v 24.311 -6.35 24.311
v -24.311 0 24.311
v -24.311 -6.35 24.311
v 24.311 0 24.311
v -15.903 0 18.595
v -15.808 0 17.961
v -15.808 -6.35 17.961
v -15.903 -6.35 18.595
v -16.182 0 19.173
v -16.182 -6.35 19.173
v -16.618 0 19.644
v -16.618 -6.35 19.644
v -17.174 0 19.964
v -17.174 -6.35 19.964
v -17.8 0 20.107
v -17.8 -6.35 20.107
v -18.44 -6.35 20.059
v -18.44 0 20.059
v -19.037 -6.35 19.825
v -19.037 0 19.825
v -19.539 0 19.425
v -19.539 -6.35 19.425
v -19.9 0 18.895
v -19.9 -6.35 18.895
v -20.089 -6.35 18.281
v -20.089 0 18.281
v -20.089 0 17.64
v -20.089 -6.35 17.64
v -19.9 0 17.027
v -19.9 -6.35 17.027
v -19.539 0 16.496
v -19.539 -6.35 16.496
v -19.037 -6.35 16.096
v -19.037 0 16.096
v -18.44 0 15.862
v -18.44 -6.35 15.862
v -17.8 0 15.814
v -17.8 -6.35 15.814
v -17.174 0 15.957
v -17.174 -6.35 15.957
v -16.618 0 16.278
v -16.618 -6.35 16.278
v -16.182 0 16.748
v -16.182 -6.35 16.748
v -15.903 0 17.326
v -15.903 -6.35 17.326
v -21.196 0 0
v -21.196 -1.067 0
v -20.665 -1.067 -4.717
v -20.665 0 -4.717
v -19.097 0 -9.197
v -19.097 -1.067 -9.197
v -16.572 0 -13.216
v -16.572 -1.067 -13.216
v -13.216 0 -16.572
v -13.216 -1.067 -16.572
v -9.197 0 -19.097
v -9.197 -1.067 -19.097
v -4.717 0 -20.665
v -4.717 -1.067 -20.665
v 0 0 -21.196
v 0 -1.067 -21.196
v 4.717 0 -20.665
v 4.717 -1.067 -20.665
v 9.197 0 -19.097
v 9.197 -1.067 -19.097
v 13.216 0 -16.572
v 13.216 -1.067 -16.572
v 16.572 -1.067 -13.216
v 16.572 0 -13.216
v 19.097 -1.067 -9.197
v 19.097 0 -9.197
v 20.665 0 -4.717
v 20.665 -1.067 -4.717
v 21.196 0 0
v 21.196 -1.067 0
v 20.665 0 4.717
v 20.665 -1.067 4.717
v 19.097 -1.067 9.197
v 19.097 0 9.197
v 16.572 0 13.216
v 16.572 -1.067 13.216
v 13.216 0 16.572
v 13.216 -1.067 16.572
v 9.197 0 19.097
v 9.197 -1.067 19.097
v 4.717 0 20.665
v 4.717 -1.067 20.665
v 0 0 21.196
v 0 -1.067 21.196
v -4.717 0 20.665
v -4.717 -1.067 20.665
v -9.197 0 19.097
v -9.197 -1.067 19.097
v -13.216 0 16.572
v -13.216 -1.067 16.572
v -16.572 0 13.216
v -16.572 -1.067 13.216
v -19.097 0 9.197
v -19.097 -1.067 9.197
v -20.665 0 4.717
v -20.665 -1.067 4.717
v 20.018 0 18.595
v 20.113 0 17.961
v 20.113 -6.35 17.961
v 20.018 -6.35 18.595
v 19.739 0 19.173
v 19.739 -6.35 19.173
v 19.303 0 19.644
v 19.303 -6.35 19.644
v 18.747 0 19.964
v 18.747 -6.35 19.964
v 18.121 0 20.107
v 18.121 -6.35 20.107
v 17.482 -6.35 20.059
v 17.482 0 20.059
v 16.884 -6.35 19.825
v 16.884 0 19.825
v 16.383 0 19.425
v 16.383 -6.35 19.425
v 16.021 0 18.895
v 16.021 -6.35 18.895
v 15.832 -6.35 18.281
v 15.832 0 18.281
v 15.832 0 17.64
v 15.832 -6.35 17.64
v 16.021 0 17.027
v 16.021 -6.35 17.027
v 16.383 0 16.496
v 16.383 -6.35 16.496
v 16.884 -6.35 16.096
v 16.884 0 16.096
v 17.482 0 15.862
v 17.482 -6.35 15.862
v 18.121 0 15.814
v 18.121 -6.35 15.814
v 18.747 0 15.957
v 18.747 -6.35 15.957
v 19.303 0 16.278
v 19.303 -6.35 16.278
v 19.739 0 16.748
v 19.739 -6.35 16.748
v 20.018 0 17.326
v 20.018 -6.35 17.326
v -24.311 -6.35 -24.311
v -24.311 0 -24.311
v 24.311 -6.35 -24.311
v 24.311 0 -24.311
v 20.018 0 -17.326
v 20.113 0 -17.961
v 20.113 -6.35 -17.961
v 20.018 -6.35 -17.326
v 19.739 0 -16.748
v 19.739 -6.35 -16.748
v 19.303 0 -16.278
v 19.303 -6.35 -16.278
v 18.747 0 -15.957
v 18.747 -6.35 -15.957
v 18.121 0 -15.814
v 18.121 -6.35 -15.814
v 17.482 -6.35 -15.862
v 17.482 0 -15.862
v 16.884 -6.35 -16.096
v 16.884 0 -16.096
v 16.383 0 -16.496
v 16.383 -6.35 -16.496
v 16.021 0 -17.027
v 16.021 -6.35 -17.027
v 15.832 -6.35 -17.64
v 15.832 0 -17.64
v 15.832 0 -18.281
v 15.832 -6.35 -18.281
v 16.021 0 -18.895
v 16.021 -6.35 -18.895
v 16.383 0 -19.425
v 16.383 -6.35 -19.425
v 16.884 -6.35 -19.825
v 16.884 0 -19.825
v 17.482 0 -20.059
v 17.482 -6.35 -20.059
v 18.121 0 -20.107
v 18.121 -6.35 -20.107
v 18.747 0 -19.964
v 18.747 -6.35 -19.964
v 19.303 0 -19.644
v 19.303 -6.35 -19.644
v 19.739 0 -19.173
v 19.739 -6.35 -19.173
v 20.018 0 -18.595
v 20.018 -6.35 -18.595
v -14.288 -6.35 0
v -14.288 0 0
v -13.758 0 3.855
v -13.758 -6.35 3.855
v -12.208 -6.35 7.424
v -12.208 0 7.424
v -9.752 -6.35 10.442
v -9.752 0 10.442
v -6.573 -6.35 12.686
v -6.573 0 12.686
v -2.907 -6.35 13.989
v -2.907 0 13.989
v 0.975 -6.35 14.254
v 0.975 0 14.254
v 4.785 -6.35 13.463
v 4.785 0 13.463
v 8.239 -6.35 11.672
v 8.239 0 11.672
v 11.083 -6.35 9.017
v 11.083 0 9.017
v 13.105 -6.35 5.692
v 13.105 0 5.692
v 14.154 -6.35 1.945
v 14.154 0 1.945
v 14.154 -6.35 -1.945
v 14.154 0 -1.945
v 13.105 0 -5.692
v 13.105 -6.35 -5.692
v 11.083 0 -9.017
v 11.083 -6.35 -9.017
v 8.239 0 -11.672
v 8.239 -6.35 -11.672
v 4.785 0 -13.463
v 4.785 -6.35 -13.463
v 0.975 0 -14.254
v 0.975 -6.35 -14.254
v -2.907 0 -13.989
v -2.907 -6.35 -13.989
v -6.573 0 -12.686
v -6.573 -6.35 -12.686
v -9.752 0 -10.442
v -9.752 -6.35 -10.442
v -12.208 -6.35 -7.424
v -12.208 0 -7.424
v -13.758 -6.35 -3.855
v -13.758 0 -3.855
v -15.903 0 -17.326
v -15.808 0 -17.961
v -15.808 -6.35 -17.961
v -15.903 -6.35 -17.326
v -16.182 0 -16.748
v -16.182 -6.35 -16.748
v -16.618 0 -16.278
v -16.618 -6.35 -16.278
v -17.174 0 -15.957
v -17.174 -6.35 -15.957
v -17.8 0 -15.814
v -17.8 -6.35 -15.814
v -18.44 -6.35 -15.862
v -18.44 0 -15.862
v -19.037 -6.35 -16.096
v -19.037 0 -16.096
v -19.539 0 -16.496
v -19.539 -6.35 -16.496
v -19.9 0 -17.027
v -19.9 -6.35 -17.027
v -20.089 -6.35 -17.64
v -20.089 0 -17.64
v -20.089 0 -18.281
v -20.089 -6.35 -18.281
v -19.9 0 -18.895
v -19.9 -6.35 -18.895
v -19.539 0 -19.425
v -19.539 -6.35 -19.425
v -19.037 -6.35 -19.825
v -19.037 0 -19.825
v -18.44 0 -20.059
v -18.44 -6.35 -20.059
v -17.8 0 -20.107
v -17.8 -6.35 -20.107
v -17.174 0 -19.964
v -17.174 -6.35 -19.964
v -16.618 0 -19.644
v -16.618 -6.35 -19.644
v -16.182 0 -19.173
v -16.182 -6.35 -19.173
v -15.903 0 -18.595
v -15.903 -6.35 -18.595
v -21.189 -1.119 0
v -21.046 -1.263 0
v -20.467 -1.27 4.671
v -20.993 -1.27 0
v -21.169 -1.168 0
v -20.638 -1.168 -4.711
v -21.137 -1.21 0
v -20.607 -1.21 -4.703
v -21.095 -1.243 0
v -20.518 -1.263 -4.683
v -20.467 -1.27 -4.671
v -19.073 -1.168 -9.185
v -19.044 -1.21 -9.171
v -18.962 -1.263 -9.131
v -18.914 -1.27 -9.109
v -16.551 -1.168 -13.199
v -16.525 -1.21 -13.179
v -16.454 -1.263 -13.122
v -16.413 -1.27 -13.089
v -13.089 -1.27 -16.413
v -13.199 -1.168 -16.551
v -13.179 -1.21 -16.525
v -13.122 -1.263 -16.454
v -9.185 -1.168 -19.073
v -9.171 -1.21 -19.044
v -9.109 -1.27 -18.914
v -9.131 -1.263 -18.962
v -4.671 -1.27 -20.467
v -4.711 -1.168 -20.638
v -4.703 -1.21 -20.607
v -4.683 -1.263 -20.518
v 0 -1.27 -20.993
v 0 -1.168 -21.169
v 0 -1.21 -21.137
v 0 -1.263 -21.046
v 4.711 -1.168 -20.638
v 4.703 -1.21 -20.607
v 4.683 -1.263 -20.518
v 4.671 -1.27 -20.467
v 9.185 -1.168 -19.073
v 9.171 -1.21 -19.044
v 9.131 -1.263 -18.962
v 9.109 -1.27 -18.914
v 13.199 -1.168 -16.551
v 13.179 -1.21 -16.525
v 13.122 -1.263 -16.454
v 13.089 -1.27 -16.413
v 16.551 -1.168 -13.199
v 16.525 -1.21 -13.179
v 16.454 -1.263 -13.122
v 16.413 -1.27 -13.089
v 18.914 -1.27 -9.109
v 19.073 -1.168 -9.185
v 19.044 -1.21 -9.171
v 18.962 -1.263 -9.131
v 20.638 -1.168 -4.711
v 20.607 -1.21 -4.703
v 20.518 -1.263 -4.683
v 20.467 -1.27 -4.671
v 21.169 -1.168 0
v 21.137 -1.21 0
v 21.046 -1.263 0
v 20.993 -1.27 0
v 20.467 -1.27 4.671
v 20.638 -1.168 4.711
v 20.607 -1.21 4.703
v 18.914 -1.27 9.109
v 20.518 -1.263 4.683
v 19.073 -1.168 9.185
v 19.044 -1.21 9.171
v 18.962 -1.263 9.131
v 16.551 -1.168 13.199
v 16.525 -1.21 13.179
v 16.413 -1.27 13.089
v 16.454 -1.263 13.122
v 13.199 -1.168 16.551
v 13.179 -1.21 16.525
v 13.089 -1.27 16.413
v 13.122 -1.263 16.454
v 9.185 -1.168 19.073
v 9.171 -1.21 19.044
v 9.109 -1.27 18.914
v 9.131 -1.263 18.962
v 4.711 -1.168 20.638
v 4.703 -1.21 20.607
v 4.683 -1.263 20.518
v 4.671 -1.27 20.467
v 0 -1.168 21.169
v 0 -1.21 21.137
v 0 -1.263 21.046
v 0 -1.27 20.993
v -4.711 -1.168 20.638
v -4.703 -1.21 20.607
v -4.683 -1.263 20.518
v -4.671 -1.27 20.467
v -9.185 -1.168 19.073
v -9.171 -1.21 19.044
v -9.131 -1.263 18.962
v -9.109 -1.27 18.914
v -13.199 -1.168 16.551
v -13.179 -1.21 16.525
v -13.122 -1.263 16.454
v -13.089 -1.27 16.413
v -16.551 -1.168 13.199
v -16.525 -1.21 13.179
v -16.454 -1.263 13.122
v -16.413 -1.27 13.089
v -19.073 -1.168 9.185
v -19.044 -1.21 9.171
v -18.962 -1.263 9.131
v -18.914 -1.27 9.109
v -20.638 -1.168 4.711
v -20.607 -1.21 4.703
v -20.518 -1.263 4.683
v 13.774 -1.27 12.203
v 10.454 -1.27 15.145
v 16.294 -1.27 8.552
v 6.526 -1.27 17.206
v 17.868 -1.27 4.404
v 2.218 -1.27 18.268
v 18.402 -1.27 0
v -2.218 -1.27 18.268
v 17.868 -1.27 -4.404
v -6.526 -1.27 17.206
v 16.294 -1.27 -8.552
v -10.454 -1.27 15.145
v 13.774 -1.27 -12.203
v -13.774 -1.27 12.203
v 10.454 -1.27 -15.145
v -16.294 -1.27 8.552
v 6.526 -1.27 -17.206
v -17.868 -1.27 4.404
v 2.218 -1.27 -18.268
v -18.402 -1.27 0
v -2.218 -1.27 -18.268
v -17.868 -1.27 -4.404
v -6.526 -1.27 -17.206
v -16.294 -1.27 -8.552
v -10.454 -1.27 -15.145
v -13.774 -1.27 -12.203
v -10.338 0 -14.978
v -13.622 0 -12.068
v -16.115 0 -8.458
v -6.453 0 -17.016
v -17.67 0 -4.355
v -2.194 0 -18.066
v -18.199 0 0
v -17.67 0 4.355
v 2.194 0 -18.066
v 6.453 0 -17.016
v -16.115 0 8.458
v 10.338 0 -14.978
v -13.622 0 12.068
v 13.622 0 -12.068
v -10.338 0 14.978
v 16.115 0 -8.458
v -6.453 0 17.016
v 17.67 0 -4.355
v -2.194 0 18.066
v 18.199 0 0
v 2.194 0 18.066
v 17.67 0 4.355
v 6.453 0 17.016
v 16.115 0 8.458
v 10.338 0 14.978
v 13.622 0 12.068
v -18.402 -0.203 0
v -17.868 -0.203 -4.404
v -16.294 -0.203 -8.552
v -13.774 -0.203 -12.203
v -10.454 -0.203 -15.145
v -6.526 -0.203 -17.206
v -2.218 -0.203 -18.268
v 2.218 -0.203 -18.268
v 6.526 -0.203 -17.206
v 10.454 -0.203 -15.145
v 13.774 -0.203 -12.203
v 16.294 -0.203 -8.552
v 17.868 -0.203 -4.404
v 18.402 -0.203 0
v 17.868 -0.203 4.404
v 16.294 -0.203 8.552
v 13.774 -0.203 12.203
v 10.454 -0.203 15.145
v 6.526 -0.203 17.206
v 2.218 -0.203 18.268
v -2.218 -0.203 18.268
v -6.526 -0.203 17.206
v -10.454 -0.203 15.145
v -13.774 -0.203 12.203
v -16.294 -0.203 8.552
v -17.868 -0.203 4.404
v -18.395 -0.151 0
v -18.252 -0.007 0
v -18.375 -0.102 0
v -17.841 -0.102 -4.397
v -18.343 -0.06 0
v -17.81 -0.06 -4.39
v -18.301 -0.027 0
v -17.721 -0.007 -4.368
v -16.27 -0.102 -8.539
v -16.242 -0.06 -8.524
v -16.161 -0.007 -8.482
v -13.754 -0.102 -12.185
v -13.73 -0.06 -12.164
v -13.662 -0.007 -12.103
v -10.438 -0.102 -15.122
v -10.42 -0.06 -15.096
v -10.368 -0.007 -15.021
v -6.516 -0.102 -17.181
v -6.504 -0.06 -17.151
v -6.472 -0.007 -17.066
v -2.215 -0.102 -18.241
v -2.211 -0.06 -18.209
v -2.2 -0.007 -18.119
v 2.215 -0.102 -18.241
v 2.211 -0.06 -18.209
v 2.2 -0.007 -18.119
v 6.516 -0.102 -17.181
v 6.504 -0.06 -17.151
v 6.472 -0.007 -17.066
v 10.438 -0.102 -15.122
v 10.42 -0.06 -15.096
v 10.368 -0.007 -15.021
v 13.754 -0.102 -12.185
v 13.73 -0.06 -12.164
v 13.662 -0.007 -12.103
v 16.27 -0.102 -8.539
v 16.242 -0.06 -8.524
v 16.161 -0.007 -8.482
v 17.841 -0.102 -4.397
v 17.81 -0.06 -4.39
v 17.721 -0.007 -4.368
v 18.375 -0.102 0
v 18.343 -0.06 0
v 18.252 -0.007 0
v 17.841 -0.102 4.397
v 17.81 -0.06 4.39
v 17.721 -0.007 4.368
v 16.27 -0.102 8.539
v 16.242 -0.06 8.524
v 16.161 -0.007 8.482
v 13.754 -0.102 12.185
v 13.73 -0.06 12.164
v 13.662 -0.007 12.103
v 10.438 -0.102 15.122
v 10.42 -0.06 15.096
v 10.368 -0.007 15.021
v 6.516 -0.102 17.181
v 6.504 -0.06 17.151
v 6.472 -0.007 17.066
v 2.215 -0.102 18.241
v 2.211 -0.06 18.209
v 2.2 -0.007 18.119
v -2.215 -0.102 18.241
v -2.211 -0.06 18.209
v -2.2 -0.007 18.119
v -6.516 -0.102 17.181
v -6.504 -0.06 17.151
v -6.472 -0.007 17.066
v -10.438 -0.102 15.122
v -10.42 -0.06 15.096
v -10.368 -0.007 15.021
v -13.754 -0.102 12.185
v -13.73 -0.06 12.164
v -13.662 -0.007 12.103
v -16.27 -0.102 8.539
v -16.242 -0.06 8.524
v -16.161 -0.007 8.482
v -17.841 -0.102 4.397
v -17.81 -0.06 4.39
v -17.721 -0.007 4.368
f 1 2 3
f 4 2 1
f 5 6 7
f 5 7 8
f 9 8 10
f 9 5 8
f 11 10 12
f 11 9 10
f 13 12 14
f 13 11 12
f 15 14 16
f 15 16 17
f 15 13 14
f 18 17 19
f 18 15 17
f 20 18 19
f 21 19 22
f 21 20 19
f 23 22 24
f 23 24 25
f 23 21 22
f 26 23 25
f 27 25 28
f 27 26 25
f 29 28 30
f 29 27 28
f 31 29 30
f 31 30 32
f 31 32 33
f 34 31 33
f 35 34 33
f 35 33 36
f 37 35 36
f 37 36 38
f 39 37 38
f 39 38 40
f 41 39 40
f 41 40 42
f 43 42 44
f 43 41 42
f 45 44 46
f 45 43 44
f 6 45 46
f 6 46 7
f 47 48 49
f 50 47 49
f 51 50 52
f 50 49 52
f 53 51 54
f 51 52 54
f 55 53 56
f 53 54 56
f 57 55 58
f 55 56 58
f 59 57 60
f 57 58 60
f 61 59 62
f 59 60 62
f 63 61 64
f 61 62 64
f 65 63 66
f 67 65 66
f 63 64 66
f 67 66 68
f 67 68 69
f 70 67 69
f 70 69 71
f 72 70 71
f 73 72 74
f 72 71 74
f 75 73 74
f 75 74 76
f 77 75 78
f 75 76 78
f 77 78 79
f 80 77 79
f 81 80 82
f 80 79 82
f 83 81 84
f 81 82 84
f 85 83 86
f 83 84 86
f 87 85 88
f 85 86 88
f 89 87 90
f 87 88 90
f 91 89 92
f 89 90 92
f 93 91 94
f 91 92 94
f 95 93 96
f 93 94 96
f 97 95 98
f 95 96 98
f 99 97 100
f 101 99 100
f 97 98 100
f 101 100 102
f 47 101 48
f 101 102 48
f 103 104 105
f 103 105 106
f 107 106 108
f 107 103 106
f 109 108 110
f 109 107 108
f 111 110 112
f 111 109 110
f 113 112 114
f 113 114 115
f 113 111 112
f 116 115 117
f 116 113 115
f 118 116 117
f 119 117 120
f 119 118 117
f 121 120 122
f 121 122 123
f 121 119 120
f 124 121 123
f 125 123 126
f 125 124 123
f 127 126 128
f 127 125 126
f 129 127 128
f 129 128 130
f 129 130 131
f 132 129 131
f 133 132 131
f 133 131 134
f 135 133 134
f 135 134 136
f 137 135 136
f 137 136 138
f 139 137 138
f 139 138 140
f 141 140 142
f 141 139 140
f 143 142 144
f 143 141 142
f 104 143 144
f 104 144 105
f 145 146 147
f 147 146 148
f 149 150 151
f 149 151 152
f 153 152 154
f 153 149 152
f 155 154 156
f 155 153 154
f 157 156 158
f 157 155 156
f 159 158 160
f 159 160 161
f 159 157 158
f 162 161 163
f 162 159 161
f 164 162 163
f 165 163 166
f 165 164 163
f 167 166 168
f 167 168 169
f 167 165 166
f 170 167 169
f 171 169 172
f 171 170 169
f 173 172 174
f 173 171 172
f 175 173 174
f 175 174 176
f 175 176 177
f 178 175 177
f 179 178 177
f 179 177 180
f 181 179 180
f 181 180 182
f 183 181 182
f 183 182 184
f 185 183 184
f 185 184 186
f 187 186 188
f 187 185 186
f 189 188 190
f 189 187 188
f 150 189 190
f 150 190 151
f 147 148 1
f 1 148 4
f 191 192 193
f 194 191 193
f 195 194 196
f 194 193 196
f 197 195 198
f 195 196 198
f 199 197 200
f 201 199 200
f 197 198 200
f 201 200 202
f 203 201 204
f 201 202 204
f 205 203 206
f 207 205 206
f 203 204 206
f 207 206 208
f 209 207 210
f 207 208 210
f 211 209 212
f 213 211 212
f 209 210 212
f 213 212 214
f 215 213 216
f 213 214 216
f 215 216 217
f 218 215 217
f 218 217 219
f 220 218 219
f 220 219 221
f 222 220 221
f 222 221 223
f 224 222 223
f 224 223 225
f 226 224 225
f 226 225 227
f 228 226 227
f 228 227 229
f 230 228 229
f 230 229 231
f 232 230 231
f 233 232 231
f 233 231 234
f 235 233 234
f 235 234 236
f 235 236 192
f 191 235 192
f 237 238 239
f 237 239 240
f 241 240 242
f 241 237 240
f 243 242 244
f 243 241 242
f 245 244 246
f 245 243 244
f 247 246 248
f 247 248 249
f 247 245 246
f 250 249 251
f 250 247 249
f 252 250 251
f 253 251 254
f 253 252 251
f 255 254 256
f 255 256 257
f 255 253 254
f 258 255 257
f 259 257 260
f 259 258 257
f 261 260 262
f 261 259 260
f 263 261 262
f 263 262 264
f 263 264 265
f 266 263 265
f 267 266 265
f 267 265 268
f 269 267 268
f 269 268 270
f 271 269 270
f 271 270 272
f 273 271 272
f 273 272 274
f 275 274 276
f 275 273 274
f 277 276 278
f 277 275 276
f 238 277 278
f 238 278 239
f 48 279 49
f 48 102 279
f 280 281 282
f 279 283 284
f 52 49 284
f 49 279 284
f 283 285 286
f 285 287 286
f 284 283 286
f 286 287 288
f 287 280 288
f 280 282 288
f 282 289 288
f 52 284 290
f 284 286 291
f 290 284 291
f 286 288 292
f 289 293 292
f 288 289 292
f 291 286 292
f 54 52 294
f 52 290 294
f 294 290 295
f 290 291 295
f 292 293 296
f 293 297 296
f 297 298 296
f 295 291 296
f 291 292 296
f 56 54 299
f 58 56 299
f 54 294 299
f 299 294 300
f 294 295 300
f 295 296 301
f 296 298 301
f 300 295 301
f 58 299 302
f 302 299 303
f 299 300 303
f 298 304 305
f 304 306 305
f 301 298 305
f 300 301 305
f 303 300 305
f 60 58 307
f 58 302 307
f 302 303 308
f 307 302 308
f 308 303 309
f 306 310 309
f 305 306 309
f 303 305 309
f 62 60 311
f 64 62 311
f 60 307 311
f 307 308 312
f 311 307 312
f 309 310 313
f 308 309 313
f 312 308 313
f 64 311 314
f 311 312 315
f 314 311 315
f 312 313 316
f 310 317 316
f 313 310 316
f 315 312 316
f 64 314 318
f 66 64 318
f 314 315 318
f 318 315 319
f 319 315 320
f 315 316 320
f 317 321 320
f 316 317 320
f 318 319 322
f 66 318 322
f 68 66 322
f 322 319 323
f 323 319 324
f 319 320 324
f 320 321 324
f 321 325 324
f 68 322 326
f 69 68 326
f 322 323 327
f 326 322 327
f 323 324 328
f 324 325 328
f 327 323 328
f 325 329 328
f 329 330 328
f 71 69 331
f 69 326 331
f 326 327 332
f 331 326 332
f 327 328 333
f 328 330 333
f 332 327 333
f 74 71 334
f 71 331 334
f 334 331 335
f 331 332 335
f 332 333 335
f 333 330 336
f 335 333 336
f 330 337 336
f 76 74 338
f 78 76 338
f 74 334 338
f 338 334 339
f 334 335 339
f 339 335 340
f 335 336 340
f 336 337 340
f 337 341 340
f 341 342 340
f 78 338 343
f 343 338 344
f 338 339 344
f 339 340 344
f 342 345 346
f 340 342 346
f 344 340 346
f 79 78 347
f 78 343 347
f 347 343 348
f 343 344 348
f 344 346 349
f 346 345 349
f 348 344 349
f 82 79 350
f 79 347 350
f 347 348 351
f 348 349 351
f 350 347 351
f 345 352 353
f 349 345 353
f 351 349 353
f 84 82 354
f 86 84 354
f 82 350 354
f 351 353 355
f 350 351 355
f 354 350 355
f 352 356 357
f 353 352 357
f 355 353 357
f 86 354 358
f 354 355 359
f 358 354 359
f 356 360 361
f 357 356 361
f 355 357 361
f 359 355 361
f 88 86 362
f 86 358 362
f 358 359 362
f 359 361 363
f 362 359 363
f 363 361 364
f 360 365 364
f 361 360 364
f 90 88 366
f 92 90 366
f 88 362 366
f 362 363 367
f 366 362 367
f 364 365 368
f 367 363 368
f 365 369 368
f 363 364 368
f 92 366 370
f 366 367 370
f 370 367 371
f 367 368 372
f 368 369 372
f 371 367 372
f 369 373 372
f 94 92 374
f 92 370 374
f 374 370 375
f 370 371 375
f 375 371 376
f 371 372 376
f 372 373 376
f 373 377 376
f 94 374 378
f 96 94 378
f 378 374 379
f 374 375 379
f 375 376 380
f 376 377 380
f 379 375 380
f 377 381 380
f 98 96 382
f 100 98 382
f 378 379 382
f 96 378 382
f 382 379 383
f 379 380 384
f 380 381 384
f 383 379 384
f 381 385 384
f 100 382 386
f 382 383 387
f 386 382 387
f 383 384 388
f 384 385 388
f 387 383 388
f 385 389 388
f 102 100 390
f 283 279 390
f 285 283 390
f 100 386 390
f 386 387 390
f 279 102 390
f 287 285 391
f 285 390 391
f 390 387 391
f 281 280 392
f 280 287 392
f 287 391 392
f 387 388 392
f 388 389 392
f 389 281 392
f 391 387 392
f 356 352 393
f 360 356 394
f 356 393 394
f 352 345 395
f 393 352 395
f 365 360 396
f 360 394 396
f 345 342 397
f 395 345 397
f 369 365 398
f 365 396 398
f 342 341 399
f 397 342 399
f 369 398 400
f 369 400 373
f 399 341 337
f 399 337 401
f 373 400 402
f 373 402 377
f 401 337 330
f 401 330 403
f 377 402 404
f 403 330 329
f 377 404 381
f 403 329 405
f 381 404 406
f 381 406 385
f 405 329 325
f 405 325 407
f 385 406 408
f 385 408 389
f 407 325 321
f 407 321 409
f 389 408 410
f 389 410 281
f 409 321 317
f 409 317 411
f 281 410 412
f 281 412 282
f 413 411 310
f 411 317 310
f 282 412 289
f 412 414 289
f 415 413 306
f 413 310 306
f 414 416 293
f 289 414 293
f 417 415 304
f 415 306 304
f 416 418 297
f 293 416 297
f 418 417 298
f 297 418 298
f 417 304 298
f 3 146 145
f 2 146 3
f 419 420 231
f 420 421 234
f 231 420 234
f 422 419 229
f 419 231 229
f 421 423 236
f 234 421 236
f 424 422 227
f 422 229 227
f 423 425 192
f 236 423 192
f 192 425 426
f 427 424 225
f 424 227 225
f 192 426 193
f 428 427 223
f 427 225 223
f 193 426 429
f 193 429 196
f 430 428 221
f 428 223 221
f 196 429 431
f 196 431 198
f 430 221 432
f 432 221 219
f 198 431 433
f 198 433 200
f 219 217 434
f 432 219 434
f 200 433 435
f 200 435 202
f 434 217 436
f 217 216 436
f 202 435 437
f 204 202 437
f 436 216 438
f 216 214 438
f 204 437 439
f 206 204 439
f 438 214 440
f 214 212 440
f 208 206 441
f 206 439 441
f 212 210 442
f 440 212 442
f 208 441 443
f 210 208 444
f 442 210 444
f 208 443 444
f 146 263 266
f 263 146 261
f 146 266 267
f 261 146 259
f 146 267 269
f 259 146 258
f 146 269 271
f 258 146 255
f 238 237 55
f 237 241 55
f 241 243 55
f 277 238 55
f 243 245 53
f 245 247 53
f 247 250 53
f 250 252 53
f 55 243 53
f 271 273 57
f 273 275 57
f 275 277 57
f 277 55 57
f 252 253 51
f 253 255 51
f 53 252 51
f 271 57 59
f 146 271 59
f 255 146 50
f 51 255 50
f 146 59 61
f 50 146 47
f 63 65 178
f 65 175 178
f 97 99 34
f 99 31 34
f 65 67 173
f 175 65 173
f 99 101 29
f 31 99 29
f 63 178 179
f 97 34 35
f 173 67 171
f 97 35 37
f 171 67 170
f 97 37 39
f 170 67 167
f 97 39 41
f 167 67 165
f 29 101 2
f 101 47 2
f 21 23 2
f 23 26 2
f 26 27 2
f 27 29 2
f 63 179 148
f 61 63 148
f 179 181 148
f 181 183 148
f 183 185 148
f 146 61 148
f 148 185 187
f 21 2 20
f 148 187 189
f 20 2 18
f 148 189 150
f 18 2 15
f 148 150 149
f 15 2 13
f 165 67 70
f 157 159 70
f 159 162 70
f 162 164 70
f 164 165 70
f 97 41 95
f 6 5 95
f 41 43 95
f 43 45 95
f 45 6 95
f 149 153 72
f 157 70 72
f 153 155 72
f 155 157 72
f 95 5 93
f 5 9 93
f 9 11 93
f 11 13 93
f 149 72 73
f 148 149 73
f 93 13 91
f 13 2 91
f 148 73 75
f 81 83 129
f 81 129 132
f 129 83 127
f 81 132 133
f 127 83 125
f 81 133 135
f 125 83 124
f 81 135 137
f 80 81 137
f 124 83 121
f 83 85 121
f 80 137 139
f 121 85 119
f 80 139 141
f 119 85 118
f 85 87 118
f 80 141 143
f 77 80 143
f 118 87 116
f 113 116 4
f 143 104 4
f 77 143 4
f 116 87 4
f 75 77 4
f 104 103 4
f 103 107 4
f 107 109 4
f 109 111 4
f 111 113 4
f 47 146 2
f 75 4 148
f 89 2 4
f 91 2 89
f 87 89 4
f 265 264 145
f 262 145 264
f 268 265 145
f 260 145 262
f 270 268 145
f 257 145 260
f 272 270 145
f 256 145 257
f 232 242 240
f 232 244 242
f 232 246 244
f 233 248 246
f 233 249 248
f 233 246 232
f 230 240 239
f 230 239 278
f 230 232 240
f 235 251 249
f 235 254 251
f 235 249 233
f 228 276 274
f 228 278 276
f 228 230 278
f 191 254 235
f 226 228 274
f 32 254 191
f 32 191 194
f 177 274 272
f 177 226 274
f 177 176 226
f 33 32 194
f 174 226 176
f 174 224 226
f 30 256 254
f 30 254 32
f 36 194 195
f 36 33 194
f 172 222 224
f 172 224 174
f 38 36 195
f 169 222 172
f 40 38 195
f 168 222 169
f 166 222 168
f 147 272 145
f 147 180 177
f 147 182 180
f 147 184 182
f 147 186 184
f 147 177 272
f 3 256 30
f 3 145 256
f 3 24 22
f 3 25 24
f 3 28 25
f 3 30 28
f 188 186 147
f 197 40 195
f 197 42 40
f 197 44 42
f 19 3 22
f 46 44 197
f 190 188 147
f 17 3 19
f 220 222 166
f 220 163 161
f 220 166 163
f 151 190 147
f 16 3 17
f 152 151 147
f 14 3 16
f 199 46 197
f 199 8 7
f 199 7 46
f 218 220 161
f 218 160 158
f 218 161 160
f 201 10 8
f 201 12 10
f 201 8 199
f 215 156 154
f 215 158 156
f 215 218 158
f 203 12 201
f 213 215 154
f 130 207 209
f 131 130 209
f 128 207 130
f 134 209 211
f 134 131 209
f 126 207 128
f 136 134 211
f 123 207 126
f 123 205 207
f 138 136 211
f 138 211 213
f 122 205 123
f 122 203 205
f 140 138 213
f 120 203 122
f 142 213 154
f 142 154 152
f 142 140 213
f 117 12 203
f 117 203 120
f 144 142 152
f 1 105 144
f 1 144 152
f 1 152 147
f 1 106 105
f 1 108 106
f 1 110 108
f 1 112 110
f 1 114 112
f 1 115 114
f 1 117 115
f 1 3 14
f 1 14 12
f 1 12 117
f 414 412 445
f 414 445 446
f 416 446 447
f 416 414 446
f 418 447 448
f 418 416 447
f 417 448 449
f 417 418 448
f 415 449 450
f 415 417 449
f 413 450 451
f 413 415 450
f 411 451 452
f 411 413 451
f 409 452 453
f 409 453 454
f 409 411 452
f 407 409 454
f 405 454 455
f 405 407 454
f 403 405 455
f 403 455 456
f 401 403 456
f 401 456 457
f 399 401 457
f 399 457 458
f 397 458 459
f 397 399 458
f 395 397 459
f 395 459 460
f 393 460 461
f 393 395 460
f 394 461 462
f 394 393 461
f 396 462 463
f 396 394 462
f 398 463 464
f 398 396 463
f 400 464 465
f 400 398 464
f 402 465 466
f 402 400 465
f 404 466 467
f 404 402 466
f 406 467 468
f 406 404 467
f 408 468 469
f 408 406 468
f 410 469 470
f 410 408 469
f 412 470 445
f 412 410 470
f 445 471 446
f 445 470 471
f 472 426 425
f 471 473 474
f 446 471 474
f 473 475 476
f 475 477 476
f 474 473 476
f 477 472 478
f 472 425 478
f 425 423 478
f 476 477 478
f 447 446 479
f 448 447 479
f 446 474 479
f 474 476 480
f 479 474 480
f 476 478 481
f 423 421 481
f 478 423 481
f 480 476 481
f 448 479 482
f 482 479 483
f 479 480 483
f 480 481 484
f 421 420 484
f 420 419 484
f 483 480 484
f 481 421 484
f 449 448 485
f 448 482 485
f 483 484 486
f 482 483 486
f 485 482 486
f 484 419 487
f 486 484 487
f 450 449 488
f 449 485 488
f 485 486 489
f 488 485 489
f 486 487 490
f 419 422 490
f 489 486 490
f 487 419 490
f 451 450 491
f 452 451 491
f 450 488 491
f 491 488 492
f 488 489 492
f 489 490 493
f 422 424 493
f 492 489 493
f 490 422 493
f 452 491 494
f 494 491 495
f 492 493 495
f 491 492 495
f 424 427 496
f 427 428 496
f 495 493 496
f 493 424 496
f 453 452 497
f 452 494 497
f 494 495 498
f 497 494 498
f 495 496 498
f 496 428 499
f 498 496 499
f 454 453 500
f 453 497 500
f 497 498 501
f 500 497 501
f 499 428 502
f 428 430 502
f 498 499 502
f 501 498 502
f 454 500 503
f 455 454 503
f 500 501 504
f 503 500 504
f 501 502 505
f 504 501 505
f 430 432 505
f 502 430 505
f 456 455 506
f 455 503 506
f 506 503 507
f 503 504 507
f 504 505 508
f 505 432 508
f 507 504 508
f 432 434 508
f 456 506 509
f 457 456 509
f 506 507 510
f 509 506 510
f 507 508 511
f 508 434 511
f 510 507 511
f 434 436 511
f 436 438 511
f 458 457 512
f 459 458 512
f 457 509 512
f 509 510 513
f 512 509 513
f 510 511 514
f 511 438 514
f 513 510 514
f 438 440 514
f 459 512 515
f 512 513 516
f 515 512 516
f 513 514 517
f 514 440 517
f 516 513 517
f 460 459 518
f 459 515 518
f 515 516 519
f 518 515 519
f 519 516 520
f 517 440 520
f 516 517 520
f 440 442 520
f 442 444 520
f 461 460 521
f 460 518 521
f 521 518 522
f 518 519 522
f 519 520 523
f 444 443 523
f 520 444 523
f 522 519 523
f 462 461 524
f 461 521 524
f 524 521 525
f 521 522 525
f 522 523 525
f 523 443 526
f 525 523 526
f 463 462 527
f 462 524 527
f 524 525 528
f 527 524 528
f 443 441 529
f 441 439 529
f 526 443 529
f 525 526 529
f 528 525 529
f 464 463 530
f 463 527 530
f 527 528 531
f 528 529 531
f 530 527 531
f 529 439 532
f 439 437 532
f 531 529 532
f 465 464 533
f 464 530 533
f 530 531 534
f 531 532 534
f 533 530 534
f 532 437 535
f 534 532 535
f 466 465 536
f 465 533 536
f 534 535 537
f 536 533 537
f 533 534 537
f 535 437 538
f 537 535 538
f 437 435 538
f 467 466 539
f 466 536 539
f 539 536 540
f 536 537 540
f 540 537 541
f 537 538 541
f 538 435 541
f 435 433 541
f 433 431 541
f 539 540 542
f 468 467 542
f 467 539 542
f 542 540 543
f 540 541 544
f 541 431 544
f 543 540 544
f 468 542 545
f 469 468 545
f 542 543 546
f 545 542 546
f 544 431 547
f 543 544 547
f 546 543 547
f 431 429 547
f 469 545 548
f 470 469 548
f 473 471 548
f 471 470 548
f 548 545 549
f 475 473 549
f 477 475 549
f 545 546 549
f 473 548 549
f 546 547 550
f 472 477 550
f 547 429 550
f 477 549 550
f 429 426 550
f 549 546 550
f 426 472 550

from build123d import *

# Parameters (mm, degrees)
F0_W      = 48.6210244843
F0_H      = 48.6210244843
F0_R      = 2.15265
F1_DEPTH  = 6.35
F6_W      = 2.794
F6_H      = 1.27
F8_R      = 0.2032
F9_R      = 14.2875
F10_DEPTH = 6.351


with BuildPart() as f1:
    # F0 (on Front) → F1 (new body)
    with BuildSketch(Plane.XZ):
        Rectangle(F0_W, F0_H)
        with Locations((-17.9605122421, -17.9605122421)):
            Circle(F0_R, mode=Mode.SUBTRACT)
        with Locations((17.9605122421, -17.9605122421)):
            Circle(F0_R, mode=Mode.SUBTRACT)
        with Locations((-17.9605122421, 17.9605122421)):
            Circle(F0_R, mode=Mode.SUBTRACT)
        with Locations((17.9605122421, 17.9605122421)):
            Circle(F0_R, mode=Mode.SUBTRACT)
    extrude(amount=F1_DEPTH)

    # F6 (on 3pt) → F7 (revolve, cut)
    with BuildSketch(Plane(origin=(0, 0, 0), x_dir=(1, 0, 0), z_dir=(0, 0, -1))):
        with Locations((-19.7993, 0.635)):
            Rectangle(F6_W, F6_H)
    revolve(axis=Axis((0, 0.4501026124, 0), (0, -1, 0)), mode=Mode.SUBTRACT)

    # F8
    f8_edges = [f1.edges().sort_by_distance(p)[0] for p in [
        (21.1963, -1.27, 0),
        (18.4023, 0, 0),
    ]]
    fillet(f8_edges, radius=F8_R)

    # F9 (on face) → F10 (cut, through all)
    with BuildSketch(Plane(origin=(0, 0, 0), x_dir=(-1, 0, 0), z_dir=(0, 1, 0))):
        Circle(F9_R)
    extrude(amount=-F10_DEPTH, mode=Mode.SUBTRACT)


solid = f1.part
